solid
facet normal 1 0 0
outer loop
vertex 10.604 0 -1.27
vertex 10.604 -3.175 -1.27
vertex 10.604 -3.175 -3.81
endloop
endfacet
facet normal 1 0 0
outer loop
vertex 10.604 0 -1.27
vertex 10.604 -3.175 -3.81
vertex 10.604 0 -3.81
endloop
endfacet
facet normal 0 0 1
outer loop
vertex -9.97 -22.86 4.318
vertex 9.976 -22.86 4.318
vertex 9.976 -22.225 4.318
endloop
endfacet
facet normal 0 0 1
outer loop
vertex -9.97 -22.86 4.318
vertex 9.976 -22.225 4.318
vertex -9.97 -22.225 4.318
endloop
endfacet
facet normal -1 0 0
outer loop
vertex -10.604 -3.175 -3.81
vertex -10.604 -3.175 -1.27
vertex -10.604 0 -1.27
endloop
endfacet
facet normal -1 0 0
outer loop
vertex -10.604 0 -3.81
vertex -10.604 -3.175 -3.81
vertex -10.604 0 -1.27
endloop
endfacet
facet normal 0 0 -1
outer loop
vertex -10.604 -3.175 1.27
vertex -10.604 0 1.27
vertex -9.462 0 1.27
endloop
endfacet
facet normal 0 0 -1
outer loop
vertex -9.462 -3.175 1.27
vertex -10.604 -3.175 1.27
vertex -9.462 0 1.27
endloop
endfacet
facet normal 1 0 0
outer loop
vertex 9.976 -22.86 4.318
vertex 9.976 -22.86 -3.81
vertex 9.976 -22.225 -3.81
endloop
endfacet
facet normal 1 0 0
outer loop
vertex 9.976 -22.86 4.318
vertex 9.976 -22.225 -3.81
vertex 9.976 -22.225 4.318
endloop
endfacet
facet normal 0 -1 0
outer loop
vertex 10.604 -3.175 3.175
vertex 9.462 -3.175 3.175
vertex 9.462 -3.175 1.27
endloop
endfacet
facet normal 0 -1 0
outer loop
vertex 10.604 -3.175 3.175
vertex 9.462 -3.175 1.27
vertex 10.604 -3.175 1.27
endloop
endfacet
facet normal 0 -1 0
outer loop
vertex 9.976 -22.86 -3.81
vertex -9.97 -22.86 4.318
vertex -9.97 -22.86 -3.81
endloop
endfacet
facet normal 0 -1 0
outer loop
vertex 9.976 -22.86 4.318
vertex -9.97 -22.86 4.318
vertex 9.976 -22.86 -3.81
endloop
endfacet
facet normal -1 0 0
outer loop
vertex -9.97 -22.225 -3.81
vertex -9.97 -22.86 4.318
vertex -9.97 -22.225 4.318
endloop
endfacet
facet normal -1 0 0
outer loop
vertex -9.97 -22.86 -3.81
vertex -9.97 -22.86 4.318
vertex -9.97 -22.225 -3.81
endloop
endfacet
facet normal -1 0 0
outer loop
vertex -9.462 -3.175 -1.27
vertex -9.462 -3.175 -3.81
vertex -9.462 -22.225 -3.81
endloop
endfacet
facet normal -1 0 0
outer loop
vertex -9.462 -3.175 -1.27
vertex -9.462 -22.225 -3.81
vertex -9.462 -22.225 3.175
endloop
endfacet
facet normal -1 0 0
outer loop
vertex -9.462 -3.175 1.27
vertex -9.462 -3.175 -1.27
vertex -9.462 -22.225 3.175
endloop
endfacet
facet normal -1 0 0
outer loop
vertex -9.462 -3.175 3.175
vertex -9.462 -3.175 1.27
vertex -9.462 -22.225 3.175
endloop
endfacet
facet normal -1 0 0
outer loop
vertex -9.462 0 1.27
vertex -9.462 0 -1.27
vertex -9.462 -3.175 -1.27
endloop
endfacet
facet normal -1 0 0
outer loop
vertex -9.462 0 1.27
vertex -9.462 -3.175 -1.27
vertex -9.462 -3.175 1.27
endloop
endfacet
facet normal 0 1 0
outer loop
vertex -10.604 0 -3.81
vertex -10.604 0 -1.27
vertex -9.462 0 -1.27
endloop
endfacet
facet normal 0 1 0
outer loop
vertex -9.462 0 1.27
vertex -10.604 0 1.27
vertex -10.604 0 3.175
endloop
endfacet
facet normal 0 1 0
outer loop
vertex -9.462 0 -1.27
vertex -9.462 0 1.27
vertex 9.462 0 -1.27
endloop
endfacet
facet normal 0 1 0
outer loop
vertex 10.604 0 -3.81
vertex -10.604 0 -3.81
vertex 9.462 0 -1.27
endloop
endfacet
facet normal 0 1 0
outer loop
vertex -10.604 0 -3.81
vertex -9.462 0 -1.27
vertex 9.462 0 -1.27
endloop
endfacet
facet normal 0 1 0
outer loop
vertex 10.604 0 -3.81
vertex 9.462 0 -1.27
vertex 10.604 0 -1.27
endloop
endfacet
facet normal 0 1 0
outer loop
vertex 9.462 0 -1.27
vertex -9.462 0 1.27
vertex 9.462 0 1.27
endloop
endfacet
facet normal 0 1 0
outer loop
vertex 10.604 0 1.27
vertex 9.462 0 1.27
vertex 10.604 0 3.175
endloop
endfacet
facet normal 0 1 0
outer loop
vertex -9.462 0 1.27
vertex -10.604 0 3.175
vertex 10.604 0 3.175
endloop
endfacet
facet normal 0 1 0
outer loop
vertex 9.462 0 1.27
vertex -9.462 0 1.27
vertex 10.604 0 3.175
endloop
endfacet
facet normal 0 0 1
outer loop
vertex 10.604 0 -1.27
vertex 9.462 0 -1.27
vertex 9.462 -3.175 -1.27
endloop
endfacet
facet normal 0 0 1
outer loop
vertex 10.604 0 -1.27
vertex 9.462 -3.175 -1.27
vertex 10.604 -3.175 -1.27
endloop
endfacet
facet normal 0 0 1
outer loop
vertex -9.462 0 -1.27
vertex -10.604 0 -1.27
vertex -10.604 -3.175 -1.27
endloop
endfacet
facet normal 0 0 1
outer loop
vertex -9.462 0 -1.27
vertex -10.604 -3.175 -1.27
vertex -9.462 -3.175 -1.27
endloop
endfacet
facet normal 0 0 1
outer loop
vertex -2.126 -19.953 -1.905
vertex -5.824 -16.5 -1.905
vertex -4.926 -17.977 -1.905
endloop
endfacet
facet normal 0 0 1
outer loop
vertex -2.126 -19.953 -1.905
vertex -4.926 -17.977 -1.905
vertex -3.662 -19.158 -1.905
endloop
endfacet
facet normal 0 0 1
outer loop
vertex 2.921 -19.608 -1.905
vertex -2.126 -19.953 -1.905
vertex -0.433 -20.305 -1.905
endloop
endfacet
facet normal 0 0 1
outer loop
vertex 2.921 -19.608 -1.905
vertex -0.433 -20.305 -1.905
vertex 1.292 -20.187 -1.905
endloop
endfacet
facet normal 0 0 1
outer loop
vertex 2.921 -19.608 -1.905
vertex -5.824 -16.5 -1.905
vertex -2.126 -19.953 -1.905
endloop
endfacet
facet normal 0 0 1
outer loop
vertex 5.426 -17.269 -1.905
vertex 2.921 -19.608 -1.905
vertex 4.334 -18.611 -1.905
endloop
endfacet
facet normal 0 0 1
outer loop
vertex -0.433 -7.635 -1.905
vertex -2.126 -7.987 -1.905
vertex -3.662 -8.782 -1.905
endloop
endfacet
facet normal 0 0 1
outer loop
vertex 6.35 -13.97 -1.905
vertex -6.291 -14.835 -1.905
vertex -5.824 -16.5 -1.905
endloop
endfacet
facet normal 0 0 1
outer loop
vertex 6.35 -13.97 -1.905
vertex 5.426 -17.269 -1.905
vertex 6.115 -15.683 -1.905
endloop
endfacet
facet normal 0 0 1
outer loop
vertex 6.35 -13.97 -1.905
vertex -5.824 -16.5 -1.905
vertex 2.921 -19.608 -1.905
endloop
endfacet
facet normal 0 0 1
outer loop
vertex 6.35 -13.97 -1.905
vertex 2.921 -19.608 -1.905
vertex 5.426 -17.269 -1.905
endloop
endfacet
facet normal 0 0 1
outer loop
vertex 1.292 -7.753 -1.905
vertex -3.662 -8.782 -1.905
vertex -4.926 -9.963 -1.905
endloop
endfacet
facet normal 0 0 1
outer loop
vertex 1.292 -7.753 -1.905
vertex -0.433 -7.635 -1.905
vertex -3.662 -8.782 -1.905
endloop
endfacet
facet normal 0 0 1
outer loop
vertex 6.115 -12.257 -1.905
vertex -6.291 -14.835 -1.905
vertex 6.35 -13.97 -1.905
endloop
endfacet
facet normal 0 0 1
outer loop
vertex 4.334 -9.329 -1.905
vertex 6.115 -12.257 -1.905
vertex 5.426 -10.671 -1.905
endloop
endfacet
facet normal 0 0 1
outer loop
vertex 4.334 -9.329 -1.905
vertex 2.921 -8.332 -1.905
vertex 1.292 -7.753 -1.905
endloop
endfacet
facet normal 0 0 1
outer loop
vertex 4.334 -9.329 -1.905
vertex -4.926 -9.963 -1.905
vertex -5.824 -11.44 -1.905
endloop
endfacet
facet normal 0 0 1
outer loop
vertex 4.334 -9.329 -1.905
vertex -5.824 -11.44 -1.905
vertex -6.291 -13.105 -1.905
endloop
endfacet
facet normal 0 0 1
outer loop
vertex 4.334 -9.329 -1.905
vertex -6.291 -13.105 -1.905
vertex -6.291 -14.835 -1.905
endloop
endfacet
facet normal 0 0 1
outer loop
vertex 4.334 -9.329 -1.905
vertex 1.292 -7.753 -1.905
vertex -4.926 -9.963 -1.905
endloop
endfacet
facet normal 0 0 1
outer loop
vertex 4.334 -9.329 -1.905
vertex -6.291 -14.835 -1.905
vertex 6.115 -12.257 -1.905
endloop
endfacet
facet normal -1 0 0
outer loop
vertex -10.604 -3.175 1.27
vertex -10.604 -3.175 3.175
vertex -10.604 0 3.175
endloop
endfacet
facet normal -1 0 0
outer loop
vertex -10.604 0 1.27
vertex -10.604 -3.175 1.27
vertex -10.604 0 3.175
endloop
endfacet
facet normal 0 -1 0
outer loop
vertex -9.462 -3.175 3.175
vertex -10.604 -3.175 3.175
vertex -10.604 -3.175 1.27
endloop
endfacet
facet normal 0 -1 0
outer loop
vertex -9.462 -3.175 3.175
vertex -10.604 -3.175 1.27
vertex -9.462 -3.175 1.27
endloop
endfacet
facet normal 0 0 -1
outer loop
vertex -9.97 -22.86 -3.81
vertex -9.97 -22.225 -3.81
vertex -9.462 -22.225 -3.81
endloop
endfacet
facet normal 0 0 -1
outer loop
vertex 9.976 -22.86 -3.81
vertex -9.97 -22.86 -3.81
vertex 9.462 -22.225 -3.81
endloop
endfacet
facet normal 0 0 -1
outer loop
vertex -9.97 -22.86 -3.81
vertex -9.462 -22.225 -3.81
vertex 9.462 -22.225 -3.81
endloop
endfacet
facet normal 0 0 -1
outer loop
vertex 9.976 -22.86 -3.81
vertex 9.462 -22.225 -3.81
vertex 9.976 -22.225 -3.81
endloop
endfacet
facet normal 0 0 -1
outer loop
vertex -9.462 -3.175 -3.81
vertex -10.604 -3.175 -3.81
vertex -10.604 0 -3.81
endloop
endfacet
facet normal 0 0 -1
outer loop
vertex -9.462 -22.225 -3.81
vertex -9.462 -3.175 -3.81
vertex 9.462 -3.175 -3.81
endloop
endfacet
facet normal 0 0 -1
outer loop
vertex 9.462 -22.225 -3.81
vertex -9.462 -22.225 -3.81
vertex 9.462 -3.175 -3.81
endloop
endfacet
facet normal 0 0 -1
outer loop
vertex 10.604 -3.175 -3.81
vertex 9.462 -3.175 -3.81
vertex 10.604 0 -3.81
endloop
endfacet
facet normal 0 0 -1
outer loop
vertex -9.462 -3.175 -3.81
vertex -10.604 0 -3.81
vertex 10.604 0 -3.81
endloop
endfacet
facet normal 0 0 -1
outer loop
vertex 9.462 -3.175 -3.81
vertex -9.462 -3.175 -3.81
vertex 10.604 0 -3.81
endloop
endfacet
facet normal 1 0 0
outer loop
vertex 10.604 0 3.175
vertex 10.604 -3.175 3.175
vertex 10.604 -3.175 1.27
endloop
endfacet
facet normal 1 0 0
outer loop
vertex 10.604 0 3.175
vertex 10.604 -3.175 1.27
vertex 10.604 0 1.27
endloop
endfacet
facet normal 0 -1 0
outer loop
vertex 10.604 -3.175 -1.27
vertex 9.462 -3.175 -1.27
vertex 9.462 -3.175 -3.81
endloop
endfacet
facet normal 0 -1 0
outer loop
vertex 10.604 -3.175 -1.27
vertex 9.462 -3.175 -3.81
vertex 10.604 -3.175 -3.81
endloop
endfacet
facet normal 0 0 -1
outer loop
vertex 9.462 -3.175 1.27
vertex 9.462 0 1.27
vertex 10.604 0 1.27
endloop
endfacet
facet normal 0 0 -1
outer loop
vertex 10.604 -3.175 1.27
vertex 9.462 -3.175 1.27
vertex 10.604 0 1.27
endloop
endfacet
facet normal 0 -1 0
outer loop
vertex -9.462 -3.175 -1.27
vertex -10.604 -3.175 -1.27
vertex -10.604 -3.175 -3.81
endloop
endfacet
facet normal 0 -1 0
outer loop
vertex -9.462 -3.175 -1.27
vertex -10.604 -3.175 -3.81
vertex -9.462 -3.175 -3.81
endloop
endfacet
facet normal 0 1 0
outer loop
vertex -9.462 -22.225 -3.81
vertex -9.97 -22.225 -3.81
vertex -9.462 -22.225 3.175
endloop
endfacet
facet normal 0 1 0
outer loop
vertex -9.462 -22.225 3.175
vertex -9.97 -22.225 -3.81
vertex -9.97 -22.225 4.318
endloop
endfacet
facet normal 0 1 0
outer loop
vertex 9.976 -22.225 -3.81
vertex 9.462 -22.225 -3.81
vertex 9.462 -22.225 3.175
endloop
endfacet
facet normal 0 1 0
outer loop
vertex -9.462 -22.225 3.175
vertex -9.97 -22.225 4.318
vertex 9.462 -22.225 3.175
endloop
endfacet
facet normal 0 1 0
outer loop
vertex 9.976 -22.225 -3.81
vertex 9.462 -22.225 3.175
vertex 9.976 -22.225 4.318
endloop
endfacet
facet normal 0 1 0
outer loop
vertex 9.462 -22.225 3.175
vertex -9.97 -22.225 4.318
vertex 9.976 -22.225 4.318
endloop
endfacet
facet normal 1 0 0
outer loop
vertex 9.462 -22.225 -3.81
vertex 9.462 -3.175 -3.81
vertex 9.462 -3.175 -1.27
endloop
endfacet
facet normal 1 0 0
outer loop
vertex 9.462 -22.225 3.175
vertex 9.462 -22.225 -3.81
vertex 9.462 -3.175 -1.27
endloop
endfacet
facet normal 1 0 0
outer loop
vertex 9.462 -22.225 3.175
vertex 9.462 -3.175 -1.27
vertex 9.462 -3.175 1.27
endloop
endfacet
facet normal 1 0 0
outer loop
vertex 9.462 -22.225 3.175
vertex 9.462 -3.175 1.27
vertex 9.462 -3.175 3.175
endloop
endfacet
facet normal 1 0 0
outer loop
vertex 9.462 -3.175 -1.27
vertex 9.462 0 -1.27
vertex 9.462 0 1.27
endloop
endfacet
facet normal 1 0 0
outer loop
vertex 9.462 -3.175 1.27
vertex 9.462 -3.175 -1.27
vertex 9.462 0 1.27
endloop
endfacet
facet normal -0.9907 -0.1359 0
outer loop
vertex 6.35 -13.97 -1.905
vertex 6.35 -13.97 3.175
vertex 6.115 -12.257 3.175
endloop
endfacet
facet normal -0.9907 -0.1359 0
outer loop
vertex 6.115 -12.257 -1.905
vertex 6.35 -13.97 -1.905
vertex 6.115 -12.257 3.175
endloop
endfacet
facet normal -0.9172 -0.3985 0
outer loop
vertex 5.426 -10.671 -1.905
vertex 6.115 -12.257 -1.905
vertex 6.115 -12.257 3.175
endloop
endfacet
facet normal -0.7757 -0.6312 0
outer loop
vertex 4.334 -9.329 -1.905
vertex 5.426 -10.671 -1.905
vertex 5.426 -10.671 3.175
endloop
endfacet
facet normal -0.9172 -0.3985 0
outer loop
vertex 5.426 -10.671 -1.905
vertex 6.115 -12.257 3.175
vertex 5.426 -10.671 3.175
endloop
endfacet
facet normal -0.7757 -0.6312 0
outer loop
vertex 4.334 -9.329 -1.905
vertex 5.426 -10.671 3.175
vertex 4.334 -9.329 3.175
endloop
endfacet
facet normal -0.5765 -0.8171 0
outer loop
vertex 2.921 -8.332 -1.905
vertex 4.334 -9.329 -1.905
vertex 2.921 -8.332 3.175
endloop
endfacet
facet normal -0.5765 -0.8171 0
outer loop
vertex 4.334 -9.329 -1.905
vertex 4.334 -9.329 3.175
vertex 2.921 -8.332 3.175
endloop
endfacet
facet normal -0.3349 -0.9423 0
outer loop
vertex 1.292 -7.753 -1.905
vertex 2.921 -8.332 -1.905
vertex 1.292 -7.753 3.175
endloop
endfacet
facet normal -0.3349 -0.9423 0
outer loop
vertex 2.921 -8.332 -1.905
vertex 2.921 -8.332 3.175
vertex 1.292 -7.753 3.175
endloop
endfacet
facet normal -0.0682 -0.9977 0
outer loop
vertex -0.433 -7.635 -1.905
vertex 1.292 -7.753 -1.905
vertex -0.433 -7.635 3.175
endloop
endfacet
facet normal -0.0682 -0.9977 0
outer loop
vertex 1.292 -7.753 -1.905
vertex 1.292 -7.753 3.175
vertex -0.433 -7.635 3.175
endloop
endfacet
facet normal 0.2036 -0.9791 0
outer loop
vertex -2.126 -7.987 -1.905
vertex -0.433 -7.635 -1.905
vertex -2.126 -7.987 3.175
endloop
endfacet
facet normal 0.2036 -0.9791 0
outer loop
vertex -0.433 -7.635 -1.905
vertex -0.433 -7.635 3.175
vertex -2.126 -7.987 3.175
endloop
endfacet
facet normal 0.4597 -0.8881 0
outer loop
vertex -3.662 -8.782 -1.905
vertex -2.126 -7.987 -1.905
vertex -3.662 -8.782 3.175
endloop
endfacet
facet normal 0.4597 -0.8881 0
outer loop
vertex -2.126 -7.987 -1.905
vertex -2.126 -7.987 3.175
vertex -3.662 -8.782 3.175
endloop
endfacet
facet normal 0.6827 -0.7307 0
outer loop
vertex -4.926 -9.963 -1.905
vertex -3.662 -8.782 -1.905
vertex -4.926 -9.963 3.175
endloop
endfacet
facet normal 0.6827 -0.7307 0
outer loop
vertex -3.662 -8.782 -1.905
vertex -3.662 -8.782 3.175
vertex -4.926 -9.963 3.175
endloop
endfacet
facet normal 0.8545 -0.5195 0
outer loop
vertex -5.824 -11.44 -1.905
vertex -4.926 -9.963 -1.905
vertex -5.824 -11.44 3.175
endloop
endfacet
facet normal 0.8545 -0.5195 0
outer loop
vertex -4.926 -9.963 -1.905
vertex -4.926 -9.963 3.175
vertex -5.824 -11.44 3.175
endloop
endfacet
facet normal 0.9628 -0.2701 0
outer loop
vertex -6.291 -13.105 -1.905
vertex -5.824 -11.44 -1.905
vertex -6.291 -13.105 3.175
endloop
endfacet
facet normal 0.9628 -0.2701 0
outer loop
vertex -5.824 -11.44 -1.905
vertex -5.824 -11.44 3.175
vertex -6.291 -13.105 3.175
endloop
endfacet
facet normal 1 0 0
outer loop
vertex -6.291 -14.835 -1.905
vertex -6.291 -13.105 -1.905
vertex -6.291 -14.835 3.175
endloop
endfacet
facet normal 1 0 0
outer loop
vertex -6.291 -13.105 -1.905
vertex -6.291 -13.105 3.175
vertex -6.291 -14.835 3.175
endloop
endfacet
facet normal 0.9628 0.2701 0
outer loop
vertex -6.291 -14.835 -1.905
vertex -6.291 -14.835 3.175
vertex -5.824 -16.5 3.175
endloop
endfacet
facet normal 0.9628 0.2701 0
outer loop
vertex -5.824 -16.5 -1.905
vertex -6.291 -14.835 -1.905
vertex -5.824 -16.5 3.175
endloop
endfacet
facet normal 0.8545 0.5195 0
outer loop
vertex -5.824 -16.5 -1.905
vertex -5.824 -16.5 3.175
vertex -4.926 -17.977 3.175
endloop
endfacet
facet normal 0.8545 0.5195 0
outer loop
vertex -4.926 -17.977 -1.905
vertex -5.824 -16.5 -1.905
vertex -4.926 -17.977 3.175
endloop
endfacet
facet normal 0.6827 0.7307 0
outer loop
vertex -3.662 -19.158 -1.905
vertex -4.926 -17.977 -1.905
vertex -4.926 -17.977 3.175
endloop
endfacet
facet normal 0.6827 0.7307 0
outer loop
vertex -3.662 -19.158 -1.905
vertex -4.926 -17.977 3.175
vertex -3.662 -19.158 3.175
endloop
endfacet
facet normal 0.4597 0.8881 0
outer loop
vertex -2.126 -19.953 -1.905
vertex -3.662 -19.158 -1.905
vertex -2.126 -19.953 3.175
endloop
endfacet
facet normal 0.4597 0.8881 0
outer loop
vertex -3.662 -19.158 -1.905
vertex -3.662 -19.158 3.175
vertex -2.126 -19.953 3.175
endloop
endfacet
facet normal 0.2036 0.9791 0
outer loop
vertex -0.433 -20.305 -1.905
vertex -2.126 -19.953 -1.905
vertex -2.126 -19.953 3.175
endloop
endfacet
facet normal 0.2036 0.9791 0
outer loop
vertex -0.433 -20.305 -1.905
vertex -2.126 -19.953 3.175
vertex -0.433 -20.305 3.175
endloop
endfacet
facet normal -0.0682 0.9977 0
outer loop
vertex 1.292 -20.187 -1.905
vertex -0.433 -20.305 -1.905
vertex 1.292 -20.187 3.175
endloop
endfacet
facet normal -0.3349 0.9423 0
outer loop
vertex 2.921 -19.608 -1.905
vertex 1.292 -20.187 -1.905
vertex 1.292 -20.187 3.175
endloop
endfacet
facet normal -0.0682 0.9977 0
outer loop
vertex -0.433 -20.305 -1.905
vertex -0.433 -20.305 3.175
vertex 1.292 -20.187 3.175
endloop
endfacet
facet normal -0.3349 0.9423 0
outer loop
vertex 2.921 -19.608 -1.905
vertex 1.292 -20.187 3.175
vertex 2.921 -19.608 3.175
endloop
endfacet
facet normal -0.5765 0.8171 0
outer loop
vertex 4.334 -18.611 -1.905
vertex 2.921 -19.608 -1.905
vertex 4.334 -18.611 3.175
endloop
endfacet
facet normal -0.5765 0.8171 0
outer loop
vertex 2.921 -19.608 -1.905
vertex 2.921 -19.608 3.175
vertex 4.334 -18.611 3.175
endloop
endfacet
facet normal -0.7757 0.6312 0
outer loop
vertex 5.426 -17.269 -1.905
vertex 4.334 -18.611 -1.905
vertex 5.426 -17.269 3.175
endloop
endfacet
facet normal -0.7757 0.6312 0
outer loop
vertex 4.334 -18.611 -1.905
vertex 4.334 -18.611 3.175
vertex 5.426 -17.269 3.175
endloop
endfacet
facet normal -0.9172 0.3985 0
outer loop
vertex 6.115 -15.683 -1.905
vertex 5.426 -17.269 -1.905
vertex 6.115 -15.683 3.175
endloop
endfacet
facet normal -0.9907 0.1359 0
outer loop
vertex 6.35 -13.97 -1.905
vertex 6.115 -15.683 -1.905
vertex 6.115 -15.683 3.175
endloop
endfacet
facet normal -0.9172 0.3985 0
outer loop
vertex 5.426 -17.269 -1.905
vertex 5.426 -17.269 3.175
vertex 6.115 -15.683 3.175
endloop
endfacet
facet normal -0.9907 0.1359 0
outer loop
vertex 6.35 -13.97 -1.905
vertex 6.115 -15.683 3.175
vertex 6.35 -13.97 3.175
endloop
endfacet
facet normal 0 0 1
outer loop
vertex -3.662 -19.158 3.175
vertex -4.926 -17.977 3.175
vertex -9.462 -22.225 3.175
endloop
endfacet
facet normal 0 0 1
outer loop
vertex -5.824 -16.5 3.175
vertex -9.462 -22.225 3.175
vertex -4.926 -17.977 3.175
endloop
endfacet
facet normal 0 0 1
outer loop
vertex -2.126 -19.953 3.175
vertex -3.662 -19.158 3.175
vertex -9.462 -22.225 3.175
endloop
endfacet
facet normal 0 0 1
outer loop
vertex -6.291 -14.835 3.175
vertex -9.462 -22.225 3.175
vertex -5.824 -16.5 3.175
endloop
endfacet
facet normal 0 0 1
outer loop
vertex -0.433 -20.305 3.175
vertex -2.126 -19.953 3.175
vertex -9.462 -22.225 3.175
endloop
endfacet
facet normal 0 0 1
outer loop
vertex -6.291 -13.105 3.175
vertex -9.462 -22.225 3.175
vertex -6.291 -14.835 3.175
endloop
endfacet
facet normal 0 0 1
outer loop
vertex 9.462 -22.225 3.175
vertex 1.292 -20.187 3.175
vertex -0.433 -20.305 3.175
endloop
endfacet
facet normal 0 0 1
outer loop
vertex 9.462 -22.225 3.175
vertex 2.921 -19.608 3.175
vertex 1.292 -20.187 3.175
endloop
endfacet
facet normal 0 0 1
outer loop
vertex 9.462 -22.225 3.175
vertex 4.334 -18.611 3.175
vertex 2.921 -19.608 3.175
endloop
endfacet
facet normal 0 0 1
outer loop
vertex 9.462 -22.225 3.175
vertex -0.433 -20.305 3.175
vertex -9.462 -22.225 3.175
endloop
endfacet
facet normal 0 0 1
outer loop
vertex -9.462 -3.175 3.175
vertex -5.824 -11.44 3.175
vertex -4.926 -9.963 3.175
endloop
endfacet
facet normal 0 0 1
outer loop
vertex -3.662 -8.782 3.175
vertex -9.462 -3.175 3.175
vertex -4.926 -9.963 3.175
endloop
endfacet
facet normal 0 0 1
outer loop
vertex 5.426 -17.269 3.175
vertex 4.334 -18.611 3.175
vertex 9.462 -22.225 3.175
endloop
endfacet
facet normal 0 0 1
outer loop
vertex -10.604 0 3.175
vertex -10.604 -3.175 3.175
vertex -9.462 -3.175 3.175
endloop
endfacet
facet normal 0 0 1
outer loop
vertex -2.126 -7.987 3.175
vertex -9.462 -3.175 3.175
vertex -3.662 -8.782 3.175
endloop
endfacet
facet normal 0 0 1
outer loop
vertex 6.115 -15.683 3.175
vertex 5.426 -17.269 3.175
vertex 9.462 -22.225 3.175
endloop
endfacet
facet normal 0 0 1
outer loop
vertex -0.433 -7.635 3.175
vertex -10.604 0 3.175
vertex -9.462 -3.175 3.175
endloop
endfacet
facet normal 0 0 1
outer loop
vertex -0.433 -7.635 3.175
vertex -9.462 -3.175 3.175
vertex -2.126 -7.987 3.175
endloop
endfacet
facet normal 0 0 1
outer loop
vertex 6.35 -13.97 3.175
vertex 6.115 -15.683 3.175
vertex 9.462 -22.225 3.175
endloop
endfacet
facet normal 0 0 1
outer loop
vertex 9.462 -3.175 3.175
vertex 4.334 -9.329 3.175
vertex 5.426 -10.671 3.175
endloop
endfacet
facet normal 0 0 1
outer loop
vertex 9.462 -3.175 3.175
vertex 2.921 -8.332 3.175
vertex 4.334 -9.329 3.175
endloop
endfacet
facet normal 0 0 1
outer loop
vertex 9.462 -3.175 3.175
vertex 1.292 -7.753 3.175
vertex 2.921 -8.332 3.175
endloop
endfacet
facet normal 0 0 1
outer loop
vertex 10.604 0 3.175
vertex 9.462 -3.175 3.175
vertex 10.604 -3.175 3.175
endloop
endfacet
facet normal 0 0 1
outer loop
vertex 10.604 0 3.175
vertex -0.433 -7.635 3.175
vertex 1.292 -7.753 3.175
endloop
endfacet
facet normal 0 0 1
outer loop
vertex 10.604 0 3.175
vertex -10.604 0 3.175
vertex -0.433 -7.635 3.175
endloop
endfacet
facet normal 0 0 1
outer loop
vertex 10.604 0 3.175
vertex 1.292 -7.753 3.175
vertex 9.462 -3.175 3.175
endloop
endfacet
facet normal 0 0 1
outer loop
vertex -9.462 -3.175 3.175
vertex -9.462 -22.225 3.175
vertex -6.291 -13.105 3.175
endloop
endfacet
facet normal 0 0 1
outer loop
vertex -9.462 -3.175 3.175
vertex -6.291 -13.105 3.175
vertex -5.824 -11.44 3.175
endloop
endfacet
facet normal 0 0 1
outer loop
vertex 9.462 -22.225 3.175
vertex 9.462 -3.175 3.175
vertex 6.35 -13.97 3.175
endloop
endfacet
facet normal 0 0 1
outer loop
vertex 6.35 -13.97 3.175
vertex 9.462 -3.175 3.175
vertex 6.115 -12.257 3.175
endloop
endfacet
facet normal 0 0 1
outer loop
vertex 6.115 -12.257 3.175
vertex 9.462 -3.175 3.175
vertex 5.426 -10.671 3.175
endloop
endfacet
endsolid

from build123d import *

# Parameters (mm, degrees)
F0_W     = 18.923
F0_H     = 6.985
F1_DEPTH = 22.86
F3_DEPTH = 0.635
F4_R     = 6.35
F5_DEPTH = 5.08
F4_W     = 1.143
F4_H     = 3.175
F6_DEPTH = 6.985
F7_W     = 1.143
F7_H     = 2.54
F8_DEPTH = 12.7


with BuildPart() as f1:
    # F0 (on Front) → F1 (new body)
    with BuildSketch(Plane.XZ):
        with Locations((0, -0.3175)):
            Rectangle(F0_W, F0_H)
    extrude(amount=F1_DEPTH)

    # F2 (on face) → F3 (join)
    with BuildSketch(Plane.XZ.offset(22.86)):
        Polygon((9.976428, 4.318), (-9.9695, 4.318), (-9.9695, -3.81), (-9.4615, -3.81), (-9.4615, 3.175), (9.4615, 3.175), (9.4615, -3.81), (9.976428, -3.81), align=None)
    extrude(amount=-F3_DEPTH)

    # F4 (on face) → F5 (cut)
    with BuildSketch(Plane.XY.offset(3.175)):
        with Locations((0, -13.97)):
            Circle(F4_R)
    extrude(amount=-F5_DEPTH, mode=Mode.SUBTRACT)

    # F4 (on face) → F6 (join, through all)
    with BuildSketch(Plane.XY.offset(3.175)):
        with Locations((-10.033, -1.5875)):
            Rectangle(F4_W, F4_H)
        with Locations((10.033, -1.5875)):
            Rectangle(F4_W, F4_H)
    extrude(amount=-F6_DEPTH)

    # F7 (on face) → F8 (cut)
    with BuildSketch(Plane.XZ):
        with Locations((10.033, 0)):
            Rectangle(F7_W, F7_H)
        with Locations((-10.033, 0)):
            Rectangle(F7_W, F7_H)
    extrude(amount=F8_DEPTH, mode=Mode.SUBTRACT)


solid = f1.part
